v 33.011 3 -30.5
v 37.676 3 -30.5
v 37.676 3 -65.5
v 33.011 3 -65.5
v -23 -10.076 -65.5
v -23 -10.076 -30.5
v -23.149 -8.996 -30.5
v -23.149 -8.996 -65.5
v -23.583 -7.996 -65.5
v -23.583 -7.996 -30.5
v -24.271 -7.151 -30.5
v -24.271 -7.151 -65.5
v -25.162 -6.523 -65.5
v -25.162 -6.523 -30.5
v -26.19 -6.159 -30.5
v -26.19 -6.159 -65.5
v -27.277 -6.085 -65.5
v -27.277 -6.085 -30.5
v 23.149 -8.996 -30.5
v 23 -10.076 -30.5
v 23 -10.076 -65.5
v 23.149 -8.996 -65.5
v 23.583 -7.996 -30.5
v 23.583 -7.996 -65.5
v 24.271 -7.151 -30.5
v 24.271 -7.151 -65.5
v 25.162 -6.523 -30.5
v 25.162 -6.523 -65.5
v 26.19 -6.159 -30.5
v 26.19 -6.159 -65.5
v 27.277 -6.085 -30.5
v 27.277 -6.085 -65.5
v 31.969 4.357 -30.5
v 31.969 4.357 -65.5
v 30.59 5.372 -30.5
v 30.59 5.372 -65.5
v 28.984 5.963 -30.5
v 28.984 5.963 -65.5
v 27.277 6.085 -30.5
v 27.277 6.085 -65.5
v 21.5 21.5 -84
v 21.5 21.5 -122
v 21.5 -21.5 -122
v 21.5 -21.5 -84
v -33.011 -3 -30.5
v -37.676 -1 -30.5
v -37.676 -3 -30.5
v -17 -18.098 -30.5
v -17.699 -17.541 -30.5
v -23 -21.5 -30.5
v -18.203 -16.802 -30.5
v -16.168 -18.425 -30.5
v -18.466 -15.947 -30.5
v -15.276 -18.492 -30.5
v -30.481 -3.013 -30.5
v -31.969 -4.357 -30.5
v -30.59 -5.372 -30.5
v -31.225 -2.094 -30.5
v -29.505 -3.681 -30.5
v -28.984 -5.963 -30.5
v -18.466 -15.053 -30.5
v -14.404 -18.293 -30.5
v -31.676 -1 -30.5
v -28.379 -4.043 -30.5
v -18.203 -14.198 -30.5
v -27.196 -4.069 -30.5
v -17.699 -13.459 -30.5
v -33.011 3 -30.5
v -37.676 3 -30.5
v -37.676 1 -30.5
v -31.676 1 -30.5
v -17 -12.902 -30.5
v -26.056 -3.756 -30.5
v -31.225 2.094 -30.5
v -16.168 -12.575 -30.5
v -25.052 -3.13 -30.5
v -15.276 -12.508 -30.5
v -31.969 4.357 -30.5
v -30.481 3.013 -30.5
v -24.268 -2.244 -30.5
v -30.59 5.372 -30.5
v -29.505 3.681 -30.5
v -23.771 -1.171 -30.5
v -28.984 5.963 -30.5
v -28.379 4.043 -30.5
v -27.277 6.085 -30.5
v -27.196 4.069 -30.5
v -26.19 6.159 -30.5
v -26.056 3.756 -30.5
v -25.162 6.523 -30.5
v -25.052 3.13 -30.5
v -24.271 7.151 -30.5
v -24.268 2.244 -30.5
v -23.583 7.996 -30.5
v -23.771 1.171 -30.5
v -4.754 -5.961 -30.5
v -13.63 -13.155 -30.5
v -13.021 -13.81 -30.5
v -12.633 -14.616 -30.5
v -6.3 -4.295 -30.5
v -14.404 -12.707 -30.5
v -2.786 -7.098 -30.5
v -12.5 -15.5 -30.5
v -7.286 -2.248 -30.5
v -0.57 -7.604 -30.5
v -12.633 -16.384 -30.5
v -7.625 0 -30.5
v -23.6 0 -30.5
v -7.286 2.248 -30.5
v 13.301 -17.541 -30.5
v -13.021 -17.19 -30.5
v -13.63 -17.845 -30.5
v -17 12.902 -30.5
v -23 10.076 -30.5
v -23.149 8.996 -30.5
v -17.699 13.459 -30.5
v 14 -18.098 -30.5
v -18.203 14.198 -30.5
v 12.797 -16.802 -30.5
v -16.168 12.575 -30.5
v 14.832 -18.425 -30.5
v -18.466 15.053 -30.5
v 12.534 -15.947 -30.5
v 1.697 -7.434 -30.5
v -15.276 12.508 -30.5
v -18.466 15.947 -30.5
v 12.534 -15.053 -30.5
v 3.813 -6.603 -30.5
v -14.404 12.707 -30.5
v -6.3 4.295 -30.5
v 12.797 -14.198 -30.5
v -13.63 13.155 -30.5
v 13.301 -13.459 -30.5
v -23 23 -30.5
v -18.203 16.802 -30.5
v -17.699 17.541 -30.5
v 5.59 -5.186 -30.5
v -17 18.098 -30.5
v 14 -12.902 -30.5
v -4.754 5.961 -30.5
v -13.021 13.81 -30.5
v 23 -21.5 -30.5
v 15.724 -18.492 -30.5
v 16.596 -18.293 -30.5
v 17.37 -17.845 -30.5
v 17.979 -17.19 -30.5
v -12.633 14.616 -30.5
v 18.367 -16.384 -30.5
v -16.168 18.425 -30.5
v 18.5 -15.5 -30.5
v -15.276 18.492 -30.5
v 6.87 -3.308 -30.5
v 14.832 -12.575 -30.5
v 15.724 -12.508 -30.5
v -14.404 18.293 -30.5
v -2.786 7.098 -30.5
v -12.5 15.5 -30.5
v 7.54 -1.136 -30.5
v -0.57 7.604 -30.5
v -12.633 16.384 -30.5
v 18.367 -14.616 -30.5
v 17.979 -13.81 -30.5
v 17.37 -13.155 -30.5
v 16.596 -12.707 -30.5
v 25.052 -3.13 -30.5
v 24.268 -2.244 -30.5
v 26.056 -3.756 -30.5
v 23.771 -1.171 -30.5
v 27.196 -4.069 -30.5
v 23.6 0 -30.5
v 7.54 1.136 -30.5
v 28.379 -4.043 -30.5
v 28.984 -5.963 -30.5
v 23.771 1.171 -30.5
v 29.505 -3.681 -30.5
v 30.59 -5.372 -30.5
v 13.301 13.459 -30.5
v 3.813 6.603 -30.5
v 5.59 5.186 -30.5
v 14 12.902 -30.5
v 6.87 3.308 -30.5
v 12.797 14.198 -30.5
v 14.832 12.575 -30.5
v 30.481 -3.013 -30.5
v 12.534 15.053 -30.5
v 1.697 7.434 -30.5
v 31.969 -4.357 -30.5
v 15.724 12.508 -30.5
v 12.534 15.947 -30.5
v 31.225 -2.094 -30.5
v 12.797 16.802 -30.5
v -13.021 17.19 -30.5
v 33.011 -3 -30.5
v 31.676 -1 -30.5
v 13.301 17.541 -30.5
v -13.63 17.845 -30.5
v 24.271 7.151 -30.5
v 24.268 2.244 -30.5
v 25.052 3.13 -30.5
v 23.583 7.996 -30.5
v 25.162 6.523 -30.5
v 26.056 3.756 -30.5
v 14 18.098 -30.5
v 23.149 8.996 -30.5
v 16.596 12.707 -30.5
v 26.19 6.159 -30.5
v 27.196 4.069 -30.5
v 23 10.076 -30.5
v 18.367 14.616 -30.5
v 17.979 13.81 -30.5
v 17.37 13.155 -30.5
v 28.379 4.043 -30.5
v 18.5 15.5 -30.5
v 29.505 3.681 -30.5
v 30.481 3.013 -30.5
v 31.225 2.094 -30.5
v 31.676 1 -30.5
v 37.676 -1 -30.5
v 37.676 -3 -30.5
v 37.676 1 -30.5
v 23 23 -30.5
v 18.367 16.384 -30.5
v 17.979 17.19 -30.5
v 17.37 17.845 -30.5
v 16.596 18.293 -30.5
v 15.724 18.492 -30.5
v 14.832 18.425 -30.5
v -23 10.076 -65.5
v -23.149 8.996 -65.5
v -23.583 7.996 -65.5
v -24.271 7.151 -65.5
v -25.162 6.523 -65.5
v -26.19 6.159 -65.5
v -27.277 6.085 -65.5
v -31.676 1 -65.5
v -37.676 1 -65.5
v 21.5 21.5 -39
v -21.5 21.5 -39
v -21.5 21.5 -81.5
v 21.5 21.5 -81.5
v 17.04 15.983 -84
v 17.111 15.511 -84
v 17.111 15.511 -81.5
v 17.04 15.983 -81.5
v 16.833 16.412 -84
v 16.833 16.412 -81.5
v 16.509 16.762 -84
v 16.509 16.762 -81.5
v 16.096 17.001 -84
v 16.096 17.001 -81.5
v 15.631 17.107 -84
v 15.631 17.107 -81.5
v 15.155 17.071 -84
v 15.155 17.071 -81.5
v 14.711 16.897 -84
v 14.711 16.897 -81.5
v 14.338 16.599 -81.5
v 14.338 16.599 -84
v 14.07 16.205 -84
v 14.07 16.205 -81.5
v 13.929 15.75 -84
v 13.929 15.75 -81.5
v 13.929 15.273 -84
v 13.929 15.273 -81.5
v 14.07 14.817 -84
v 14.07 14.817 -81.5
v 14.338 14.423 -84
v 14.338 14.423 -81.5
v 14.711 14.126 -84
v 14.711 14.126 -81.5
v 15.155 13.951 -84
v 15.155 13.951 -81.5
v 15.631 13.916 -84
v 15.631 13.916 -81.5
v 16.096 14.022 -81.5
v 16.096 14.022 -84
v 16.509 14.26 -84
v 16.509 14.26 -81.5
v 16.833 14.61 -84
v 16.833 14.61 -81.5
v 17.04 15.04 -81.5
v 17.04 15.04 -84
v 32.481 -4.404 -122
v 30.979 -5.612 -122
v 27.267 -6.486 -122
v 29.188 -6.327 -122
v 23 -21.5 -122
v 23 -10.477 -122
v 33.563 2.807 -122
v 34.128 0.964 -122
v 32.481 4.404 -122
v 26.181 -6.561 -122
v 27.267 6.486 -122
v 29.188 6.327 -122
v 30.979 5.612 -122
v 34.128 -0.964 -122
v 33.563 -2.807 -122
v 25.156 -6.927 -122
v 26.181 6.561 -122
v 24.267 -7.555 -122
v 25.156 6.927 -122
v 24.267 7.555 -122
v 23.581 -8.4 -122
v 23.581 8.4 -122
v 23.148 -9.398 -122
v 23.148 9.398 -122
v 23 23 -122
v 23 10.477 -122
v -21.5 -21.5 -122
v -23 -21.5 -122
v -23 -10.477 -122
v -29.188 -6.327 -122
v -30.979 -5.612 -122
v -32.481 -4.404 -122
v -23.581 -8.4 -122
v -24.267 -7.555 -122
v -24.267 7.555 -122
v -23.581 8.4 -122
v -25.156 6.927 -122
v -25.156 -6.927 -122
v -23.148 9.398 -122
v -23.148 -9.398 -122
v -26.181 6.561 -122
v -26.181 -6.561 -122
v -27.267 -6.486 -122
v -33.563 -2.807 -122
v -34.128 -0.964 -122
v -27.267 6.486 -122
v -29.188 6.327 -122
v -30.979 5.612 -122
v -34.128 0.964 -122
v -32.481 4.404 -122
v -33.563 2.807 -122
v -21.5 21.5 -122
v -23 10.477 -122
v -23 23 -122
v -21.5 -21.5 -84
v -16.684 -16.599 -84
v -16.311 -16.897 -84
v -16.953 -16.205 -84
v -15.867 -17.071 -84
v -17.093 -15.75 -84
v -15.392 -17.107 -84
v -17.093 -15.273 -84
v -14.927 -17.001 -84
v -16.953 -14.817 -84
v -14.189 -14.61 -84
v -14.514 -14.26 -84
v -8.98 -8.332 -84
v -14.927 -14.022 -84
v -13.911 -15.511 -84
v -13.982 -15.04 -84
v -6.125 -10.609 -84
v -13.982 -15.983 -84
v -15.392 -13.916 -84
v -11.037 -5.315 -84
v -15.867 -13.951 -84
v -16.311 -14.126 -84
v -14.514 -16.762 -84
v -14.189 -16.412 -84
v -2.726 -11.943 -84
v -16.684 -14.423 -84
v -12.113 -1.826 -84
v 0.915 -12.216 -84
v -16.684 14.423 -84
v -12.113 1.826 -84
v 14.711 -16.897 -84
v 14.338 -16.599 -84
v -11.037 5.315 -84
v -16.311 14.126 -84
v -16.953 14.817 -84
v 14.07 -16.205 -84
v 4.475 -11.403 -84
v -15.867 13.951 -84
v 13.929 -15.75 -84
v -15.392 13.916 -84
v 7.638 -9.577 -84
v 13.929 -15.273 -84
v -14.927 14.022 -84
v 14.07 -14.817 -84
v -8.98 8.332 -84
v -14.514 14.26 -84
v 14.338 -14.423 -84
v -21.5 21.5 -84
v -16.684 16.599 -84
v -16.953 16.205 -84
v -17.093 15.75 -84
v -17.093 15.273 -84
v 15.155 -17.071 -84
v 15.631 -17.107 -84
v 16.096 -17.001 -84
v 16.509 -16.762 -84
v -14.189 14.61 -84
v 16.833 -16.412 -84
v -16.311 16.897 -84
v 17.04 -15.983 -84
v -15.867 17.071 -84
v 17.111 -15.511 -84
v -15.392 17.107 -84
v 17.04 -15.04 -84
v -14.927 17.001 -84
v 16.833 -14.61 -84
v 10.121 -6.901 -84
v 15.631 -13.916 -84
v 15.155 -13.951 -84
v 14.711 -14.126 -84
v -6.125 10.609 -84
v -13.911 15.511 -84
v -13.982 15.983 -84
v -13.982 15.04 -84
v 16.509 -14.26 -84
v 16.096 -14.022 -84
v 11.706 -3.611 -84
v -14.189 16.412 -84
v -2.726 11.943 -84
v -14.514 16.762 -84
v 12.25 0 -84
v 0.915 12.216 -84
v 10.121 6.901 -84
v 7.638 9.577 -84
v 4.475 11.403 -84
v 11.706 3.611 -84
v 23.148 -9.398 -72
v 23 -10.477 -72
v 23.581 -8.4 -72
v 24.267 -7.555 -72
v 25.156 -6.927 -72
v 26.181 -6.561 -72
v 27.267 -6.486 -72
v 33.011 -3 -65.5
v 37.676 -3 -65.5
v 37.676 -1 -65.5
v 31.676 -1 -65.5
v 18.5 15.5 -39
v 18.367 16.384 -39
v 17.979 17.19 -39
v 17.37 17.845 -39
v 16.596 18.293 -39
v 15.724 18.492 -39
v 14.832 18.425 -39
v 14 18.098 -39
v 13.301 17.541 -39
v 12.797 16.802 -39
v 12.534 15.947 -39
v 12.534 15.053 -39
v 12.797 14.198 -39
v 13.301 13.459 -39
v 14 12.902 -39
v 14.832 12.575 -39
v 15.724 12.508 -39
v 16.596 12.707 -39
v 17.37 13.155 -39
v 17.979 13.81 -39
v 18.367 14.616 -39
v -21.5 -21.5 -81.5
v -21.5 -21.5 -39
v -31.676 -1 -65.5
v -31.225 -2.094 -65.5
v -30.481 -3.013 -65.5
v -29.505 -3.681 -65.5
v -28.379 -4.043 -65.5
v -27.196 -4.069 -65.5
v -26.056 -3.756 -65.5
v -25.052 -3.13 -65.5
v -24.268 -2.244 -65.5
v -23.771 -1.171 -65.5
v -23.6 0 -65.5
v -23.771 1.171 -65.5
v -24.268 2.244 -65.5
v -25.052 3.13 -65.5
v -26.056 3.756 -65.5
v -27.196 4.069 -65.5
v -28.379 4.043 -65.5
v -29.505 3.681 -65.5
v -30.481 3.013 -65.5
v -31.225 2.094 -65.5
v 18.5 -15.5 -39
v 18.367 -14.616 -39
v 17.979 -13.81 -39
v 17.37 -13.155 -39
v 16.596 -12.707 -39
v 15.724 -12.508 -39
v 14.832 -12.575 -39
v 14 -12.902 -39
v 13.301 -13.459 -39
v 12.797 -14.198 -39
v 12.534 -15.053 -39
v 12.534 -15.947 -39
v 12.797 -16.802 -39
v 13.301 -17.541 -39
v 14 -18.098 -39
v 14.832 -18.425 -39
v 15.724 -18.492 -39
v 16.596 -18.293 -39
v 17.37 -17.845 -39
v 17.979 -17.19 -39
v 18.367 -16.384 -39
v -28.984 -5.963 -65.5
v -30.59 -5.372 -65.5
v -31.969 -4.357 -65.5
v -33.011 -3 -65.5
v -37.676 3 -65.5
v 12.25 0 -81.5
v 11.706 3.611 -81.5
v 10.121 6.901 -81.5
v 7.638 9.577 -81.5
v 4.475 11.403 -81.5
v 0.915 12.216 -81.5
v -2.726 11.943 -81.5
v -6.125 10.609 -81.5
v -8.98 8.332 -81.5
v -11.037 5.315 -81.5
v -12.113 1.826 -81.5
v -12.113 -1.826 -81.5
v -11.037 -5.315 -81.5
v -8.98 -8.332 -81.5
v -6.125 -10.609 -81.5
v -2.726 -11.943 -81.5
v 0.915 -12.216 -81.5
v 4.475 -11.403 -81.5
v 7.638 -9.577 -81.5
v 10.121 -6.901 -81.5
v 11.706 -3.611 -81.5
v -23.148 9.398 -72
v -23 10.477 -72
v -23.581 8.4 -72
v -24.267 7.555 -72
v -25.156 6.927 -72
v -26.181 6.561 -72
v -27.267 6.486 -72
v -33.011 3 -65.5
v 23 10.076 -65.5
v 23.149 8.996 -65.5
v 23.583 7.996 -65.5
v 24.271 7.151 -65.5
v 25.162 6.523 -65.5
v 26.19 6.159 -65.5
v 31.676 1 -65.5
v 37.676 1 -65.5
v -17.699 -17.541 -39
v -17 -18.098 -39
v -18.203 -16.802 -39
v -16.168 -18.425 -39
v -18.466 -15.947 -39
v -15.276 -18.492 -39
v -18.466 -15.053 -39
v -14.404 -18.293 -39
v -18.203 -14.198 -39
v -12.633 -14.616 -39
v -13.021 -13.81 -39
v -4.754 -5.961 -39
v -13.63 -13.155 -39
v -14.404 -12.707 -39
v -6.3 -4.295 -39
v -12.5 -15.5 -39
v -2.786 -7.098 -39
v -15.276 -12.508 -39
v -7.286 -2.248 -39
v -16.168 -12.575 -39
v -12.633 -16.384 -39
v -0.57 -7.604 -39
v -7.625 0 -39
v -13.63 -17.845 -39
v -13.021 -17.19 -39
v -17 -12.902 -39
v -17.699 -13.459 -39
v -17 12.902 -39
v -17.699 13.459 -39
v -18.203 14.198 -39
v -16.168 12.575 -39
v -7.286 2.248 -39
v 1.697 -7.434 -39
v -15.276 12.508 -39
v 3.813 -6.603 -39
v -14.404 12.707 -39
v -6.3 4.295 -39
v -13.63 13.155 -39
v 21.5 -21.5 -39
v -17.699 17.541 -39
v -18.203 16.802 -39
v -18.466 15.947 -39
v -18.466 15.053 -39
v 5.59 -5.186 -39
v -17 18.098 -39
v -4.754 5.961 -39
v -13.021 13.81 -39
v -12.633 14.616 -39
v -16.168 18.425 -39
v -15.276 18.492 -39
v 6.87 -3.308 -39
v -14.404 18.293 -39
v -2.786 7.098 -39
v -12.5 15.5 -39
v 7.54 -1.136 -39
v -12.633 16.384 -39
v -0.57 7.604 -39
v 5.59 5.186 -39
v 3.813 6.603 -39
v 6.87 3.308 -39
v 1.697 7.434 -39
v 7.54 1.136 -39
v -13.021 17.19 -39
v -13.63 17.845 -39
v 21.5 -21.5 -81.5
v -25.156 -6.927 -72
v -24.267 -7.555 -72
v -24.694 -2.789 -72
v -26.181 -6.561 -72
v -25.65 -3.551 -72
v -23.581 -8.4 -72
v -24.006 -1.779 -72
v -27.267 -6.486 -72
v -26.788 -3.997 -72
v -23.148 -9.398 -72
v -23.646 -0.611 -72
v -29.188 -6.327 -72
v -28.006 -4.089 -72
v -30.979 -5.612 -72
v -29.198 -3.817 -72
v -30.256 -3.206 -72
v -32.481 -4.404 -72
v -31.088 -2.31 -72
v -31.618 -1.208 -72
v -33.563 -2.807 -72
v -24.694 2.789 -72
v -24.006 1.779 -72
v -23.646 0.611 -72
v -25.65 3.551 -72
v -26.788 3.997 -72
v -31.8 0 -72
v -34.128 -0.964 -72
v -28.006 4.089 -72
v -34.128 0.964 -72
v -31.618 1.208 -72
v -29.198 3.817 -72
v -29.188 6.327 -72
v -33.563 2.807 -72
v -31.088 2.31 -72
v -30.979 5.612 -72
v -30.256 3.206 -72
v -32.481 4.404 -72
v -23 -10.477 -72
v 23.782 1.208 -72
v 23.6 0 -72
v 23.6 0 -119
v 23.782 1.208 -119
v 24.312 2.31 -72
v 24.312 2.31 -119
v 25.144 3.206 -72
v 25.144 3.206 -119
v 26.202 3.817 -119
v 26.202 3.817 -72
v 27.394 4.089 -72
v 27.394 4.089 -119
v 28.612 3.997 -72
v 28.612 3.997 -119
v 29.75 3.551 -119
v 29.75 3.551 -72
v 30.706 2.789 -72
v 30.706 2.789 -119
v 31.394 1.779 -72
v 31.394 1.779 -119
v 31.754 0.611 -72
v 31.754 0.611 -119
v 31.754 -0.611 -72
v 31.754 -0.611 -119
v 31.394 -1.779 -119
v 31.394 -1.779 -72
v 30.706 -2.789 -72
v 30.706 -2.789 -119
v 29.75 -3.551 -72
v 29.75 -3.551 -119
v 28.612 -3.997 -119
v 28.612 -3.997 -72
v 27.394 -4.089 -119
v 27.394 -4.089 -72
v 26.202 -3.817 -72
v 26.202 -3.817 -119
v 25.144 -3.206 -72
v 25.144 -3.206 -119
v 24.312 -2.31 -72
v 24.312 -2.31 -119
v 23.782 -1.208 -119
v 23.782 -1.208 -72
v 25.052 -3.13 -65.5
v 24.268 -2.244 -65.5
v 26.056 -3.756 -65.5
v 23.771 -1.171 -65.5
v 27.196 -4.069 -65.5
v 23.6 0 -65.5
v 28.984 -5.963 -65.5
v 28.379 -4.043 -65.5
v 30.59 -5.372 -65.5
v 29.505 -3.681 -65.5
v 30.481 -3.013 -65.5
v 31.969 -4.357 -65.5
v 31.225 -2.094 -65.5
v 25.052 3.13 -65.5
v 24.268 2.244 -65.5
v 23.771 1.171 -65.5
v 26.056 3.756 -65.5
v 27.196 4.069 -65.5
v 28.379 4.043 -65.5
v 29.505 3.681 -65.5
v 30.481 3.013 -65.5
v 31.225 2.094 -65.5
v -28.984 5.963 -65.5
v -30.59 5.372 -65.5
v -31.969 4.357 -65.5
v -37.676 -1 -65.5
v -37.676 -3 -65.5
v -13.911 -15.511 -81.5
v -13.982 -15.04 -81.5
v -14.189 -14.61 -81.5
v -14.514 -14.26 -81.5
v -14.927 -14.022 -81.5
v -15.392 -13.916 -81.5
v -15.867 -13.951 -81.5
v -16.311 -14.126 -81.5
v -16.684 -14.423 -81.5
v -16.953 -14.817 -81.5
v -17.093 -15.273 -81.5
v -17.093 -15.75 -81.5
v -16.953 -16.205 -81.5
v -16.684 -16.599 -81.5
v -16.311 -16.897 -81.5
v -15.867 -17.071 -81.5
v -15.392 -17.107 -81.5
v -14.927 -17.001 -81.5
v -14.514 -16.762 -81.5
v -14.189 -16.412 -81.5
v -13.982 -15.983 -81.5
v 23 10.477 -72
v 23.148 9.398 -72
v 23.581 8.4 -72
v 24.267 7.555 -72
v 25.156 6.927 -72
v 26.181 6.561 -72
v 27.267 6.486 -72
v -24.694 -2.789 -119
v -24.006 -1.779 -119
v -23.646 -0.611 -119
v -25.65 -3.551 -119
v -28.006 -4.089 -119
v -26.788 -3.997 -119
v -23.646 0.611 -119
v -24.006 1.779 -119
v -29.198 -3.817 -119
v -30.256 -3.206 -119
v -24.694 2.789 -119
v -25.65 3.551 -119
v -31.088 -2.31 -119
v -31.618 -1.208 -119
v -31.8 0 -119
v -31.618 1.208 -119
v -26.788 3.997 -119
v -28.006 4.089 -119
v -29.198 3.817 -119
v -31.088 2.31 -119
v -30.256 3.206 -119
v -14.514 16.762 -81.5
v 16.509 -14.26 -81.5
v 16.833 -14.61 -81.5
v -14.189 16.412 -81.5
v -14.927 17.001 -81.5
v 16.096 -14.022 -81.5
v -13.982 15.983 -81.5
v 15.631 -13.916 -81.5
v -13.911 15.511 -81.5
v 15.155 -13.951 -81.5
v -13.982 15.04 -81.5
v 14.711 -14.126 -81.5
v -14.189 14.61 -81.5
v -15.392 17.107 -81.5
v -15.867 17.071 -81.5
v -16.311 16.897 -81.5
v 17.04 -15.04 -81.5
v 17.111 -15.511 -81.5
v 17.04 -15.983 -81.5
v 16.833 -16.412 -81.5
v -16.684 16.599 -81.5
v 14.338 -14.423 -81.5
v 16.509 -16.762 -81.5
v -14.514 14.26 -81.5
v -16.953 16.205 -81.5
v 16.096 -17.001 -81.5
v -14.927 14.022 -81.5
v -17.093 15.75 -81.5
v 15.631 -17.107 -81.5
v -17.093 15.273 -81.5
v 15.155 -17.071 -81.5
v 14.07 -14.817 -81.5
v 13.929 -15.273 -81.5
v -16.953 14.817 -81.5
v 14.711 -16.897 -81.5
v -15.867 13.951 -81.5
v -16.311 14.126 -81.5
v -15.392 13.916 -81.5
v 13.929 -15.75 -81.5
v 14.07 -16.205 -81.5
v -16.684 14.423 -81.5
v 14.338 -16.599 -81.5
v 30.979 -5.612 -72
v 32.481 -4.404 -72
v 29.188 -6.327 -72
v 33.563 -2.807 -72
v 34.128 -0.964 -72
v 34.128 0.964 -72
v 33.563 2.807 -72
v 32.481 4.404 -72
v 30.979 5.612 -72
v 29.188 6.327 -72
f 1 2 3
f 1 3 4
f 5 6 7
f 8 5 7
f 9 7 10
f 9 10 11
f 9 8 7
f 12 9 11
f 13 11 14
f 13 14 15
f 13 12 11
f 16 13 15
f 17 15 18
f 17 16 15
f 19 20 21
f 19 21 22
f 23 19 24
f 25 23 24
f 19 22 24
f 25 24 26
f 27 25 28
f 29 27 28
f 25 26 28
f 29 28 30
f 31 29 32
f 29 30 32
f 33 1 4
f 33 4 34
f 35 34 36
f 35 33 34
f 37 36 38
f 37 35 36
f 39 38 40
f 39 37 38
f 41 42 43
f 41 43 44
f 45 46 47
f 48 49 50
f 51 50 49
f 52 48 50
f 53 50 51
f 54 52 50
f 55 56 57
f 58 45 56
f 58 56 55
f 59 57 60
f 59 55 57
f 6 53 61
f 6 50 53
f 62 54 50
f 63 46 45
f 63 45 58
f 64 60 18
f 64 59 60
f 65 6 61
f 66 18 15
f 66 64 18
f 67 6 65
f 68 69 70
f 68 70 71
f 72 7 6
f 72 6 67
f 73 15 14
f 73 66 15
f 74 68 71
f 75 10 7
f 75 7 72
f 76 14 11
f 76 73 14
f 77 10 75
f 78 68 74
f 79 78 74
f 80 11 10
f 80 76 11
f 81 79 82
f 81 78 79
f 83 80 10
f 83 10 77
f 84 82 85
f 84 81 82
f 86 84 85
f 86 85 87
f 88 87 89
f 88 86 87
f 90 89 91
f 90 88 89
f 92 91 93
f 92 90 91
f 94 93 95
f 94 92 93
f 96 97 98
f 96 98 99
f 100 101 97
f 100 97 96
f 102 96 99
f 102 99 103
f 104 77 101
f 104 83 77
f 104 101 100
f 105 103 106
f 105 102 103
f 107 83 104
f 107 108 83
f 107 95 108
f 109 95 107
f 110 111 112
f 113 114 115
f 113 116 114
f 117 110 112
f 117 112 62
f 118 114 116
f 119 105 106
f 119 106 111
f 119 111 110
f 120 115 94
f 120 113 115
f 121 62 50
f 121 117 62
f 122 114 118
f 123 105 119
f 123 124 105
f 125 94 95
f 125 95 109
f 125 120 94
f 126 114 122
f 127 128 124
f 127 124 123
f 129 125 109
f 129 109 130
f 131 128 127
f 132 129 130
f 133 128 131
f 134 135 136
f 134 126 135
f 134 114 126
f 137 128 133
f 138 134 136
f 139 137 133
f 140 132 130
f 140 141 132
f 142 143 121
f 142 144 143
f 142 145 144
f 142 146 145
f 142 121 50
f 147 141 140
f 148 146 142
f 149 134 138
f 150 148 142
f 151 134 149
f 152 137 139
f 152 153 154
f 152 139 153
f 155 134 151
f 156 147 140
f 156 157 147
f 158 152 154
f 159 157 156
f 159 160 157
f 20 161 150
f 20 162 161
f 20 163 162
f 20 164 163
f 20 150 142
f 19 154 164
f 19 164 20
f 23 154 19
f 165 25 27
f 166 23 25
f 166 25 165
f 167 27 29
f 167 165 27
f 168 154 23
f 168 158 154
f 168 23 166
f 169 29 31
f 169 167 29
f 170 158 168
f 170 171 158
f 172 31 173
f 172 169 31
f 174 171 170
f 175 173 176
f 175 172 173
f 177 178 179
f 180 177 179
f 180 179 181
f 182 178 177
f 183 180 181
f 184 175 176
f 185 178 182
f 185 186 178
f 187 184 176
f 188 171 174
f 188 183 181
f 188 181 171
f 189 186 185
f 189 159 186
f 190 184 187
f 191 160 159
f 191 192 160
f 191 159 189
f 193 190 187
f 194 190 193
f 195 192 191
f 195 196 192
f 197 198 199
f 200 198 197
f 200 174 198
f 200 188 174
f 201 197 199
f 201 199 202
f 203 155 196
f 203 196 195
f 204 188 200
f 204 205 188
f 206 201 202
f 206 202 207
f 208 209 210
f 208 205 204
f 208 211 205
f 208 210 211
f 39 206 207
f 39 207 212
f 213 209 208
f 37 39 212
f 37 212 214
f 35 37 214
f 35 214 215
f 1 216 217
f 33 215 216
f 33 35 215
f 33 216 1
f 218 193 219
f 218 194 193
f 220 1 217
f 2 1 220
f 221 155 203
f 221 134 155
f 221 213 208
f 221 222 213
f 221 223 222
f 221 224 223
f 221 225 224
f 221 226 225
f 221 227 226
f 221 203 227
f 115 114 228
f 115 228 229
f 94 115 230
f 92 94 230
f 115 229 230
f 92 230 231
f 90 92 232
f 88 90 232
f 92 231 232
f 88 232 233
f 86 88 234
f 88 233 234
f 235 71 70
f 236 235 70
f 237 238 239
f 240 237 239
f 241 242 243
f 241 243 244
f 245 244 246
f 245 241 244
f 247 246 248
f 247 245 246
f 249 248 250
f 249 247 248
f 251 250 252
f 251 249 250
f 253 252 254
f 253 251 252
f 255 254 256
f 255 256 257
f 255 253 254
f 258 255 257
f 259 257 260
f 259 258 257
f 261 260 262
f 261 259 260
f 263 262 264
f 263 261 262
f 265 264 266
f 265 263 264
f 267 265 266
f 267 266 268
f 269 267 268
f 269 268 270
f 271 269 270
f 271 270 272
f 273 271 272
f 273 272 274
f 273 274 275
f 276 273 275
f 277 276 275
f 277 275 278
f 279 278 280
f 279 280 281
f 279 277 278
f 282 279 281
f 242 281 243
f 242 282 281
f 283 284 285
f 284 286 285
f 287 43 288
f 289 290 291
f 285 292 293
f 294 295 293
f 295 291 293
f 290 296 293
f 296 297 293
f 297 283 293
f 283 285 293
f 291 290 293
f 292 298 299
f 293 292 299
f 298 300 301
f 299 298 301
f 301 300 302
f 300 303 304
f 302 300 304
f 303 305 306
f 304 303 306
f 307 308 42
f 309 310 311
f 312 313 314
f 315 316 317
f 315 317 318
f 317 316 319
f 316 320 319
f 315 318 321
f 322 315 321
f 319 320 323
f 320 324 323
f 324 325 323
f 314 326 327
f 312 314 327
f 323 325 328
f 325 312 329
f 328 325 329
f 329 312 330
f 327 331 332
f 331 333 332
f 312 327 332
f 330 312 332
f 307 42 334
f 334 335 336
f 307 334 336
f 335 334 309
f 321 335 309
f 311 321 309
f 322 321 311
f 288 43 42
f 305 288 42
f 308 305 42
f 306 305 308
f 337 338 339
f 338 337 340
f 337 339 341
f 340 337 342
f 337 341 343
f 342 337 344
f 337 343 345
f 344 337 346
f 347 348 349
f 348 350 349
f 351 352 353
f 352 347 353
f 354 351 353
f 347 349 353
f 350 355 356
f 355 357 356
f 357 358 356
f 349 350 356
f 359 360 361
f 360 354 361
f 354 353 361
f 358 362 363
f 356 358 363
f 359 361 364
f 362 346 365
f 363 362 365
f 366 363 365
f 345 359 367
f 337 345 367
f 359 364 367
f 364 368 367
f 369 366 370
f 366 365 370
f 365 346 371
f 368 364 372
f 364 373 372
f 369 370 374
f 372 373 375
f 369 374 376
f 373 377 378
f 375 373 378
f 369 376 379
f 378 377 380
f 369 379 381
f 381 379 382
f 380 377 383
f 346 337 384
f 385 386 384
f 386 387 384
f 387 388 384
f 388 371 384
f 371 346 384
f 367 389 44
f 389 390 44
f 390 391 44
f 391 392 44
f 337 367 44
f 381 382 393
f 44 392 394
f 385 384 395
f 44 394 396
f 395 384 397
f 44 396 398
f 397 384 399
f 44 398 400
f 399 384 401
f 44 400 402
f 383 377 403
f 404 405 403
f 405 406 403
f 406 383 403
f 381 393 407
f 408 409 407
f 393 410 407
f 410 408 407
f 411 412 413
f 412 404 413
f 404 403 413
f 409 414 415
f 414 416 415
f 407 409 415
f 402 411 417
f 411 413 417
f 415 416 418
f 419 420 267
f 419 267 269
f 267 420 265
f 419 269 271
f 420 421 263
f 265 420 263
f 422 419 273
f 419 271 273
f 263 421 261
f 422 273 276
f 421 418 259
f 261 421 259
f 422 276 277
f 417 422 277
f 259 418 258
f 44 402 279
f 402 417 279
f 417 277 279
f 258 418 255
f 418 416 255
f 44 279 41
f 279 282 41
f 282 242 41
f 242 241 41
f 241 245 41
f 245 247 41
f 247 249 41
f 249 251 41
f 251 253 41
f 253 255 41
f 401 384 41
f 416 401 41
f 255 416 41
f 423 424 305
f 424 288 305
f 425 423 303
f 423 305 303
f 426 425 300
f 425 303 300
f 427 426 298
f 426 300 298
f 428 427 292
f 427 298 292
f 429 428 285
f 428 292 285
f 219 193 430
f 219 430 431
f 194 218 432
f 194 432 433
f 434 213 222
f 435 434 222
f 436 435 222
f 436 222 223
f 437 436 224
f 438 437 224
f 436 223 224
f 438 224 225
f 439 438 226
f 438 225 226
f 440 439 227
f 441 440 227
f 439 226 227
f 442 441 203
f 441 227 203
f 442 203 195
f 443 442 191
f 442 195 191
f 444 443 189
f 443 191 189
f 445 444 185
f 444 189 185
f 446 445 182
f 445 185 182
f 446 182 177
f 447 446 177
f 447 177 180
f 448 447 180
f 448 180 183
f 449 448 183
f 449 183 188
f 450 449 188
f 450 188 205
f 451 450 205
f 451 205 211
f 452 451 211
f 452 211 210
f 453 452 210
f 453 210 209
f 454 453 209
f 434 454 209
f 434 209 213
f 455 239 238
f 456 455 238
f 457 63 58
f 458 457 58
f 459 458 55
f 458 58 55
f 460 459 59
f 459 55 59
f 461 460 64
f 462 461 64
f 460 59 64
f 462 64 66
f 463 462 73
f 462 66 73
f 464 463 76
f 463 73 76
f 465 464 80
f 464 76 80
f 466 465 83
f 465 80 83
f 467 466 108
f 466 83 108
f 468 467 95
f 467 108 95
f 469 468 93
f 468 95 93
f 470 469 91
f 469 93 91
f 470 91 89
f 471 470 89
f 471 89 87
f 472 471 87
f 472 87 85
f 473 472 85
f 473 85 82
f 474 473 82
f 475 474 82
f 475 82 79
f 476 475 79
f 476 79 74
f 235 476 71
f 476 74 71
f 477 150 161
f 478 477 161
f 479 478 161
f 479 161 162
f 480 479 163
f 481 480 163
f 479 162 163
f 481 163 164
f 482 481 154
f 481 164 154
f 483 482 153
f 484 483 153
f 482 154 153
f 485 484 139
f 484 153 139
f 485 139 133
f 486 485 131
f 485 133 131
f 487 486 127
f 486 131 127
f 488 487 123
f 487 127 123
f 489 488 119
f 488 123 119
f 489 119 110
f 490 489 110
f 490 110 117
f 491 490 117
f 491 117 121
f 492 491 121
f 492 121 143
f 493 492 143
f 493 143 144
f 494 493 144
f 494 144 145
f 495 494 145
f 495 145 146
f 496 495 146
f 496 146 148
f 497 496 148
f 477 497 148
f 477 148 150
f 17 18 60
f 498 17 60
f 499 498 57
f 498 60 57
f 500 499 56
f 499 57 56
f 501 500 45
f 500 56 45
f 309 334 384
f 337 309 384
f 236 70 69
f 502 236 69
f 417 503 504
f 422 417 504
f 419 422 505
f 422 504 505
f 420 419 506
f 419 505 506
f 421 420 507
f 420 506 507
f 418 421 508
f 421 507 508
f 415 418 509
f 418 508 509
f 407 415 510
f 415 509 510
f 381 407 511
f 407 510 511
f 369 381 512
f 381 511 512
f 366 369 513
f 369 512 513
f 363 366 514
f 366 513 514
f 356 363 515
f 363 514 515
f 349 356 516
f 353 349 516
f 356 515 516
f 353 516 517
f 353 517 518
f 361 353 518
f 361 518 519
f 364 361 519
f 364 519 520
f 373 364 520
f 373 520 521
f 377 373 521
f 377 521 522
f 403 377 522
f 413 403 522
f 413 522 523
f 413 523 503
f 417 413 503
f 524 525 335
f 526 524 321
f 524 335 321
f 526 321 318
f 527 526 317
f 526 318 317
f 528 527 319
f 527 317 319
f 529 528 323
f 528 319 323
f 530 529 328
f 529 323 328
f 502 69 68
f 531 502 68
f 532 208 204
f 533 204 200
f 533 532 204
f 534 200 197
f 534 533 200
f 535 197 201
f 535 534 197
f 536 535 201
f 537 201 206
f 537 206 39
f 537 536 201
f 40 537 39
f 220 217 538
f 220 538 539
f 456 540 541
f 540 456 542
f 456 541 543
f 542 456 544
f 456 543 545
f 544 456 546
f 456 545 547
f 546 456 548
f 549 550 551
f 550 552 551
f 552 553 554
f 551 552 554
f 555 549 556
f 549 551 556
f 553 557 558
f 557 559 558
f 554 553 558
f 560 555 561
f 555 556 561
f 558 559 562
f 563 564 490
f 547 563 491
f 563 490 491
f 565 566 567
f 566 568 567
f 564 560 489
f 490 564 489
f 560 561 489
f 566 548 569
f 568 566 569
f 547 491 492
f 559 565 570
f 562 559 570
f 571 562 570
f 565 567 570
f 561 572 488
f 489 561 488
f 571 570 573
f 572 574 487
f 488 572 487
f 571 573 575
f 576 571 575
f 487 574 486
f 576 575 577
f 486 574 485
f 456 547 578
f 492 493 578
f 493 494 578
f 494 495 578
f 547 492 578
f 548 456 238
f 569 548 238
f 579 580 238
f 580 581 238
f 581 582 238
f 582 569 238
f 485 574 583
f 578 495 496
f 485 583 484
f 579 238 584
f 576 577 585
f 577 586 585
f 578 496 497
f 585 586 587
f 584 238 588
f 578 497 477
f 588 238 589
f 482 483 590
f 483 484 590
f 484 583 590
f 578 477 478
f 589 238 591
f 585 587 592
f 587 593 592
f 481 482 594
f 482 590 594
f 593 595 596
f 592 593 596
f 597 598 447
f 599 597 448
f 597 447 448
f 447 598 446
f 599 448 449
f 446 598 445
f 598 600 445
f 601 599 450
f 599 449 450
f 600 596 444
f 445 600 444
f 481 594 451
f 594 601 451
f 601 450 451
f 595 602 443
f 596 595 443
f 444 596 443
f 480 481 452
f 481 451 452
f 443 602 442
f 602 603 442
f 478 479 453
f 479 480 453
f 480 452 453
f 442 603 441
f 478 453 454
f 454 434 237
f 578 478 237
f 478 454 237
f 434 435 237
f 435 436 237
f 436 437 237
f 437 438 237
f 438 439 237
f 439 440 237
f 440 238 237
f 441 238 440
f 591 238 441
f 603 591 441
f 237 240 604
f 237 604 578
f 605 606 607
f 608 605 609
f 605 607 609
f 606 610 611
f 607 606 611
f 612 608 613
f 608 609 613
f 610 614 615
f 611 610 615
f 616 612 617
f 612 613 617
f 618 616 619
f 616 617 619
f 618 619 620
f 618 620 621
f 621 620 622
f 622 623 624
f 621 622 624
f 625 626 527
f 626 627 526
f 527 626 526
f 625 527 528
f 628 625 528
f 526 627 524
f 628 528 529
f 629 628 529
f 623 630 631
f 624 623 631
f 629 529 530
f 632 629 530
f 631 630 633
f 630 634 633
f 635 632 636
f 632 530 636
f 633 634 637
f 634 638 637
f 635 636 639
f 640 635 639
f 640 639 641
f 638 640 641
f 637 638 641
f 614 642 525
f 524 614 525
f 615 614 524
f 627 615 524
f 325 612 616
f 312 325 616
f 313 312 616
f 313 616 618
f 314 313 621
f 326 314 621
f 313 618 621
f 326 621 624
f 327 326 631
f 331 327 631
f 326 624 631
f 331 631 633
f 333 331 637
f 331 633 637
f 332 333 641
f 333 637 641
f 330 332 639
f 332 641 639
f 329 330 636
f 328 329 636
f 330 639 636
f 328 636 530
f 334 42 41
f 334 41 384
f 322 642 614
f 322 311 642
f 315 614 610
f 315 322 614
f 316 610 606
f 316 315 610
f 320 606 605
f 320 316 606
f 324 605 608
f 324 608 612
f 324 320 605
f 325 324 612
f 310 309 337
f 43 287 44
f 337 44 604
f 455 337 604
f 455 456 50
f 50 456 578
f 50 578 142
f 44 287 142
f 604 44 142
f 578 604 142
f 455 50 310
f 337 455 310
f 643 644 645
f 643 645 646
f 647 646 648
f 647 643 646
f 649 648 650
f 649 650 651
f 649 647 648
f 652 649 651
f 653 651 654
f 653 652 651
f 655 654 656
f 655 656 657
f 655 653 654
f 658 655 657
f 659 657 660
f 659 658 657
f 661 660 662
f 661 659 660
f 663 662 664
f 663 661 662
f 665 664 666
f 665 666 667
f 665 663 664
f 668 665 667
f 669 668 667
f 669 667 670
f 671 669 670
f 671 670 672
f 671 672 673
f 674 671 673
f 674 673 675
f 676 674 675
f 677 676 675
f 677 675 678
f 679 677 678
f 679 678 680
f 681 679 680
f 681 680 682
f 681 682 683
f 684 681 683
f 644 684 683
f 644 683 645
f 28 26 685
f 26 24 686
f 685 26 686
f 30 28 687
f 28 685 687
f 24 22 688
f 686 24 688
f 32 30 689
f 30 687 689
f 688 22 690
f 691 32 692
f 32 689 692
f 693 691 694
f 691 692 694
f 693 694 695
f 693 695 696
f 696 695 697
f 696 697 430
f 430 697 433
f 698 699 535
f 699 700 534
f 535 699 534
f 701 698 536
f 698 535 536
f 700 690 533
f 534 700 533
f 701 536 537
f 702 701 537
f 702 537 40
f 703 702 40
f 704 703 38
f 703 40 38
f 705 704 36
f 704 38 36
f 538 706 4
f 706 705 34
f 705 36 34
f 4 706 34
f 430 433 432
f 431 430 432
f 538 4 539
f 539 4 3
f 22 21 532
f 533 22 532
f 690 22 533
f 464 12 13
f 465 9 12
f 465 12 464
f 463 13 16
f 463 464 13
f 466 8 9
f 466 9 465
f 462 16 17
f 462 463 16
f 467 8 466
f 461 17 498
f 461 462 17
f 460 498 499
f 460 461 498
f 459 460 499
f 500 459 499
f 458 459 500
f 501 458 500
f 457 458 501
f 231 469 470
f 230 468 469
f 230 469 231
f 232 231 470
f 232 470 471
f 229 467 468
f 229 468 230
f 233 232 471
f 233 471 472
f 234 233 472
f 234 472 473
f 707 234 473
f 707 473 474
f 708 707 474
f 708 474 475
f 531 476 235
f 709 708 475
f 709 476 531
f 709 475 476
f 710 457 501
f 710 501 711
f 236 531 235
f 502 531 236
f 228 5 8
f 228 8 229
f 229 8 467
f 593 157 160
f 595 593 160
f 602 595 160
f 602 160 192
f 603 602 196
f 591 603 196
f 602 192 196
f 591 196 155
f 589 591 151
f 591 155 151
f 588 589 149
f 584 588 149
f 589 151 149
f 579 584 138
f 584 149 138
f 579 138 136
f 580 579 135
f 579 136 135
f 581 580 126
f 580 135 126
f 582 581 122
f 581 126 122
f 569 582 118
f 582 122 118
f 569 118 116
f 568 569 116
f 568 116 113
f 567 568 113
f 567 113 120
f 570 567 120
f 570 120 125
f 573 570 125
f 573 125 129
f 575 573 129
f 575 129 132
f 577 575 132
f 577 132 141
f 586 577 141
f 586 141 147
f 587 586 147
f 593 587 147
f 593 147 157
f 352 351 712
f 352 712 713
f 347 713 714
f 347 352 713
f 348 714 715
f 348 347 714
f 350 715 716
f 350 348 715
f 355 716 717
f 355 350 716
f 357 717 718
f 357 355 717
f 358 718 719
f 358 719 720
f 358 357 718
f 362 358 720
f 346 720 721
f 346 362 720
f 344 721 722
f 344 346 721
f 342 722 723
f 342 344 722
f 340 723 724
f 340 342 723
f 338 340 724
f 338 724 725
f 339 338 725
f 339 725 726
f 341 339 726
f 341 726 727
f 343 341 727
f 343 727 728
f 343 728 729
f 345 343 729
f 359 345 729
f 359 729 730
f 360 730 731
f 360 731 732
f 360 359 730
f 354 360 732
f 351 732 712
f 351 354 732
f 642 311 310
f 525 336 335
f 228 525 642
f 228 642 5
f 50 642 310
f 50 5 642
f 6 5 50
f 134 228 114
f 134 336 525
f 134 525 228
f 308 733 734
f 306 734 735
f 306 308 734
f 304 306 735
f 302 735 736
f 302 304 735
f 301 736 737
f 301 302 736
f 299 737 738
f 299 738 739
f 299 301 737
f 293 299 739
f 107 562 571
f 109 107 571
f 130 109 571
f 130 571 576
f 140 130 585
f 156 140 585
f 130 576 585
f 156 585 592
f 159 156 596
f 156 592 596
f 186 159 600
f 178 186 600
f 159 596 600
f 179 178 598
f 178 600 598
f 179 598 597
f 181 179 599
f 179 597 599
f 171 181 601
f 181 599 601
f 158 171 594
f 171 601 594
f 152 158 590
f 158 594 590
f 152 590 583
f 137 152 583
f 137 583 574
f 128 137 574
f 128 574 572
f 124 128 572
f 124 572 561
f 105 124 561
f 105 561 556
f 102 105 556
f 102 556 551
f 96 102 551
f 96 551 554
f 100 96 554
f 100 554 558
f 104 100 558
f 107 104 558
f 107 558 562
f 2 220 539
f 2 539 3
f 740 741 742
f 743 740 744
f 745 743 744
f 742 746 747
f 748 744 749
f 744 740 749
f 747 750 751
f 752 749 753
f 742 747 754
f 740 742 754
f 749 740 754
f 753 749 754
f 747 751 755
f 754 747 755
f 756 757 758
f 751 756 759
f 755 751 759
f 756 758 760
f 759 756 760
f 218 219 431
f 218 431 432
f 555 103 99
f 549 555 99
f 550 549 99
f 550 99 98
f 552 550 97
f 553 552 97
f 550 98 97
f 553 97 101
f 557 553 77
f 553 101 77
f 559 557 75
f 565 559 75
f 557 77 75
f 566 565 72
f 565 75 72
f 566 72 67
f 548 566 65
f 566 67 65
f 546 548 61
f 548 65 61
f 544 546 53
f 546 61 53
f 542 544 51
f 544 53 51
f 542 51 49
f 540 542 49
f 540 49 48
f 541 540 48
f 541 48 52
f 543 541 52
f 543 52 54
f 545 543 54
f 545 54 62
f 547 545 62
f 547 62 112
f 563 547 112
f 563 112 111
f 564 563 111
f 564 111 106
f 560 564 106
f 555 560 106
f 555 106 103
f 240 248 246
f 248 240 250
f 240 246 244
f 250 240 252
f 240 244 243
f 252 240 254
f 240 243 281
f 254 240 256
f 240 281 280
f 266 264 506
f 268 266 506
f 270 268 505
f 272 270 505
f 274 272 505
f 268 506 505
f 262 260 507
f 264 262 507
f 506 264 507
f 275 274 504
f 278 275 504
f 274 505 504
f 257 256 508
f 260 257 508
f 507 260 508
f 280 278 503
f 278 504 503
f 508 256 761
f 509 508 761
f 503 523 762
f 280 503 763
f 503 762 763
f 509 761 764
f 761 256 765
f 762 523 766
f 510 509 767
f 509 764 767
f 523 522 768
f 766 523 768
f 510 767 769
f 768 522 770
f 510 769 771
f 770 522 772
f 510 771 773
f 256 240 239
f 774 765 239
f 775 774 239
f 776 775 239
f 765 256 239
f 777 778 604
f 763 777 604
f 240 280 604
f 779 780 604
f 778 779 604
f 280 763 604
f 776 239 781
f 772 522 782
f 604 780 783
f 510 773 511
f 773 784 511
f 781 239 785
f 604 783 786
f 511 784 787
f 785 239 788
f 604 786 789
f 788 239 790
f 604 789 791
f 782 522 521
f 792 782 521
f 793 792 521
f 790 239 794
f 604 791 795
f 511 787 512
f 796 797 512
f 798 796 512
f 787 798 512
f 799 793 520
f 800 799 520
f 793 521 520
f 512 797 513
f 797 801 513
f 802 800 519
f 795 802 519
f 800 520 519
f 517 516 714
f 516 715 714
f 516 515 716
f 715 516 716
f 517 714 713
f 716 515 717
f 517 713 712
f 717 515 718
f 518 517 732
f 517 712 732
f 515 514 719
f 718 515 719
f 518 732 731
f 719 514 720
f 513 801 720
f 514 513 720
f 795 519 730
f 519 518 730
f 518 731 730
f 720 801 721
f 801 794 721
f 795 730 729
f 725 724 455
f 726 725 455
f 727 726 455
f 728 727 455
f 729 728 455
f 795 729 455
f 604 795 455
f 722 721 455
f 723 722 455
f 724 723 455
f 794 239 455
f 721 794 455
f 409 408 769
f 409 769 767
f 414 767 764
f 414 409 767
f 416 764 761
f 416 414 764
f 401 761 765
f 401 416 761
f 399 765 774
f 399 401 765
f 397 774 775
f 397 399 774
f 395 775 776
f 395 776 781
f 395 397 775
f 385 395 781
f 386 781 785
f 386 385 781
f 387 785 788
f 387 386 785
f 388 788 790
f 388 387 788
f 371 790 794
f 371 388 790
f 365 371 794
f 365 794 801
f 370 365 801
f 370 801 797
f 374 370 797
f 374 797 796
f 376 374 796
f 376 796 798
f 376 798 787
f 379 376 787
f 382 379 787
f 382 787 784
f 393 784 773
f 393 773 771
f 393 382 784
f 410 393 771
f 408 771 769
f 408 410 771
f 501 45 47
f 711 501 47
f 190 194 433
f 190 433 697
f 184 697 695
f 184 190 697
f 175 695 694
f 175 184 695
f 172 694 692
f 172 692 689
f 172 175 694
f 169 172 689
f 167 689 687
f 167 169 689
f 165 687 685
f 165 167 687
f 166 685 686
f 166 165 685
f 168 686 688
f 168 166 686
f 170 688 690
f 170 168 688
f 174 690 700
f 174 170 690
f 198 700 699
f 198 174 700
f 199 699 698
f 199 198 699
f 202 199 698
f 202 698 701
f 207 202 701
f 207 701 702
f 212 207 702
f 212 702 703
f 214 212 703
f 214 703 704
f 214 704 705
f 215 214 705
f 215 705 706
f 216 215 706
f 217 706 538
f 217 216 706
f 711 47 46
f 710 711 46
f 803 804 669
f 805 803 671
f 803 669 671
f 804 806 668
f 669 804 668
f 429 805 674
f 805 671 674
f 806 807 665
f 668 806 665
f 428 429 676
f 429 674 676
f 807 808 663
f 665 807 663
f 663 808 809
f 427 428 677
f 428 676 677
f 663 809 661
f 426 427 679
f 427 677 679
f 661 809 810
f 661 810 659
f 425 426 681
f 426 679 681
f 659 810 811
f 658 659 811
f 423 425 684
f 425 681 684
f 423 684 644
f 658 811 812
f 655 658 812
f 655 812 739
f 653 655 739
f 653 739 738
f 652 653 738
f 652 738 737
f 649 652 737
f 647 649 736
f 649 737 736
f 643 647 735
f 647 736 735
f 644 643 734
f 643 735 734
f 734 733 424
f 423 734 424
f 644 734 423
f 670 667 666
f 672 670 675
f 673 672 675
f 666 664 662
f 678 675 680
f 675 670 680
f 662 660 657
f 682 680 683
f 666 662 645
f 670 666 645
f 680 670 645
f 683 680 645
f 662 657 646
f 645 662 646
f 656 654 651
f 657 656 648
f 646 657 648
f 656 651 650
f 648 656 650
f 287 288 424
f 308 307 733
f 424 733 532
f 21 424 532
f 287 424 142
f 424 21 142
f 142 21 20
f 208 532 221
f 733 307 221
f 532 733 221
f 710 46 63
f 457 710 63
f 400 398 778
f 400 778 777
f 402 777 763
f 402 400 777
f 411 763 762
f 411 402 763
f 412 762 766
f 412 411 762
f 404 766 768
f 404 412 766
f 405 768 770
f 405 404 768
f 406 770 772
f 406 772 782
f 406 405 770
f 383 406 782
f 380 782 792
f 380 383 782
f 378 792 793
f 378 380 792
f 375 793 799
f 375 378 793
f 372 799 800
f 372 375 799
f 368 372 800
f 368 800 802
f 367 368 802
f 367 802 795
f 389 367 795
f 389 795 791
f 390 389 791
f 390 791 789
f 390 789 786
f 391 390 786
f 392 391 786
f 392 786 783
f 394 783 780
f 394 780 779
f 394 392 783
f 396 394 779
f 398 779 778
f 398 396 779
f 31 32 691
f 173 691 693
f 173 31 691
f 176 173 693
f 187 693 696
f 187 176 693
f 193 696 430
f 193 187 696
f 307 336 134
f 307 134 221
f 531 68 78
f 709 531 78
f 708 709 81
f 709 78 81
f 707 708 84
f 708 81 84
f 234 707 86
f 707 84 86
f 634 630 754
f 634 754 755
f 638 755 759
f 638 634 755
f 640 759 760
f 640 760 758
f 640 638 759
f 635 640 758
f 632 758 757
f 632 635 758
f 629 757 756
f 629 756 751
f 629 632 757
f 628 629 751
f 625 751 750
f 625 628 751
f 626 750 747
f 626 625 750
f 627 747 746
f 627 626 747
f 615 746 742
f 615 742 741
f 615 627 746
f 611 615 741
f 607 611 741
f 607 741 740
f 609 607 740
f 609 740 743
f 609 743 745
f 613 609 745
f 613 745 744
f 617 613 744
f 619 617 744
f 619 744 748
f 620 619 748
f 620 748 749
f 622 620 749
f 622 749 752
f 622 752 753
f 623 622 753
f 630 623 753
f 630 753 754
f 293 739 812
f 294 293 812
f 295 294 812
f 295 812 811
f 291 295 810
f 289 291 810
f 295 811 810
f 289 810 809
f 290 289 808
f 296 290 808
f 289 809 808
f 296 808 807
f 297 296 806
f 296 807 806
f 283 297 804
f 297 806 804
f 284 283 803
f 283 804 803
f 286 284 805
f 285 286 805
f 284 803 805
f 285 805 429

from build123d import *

# Parameters (mm, degrees)
CROQUIS2_W              = 43
CROQUIS2_H              = 43
CROQUIS2_R              = 1.6
SALIENTE_EXTRUIR2_DEPTH = 2.5
SALIENTE_EXTRUIR3_DEPTH = 1.5
SALIENTE_EXTRUIR4_DEPTH = 1.5
SALIENTE_EXTRUIR5_DEPTH = 1.5
CROQUIS7_W              = 46
CROQUIS7_H              = 8.5
SALIENTE_EXTRUIR6_DEPTH = 44.5
CROQUIS8_R              = 7.625
CORTAR_EXTRUIR1_DEPTH   = 90.145947749
CROQUIS9_R              = 3
CORTAR_EXTRUIR3_DEPTH   = 16.5
SALIENTE_EXTRUIR8_DEPTH = 1.5
SALIENTE_EXTRUIR9_DEPTH = 1.5
CROQUIS12_R             = 12.25
CUT_EXTRUDE1_DEPTH      = 10
BOSS_EXTRUDE1_DEPTH     = 35
BOSS_EXTRUDE2_START     = -50
SKETCH3_R               = 4.1
BOSS_EXTRUDE2_DEPTH     = 50
BOSS_EXTRUDE3_START     = -3
SKETCH4_R               = 4.1
BOSS_EXTRUDE3_DEPTH     = 3
FILLET1_R               = 4


with BuildPart() as part:
    # Croquis2 → Saliente-Extruir2 (new body)
    with BuildSketch(Plane.XY.offset(-84)):
        Rectangle(CROQUIS2_W, CROQUIS2_H)
        with Locations((-15.511143721, 15.511143721)):
            Circle(CROQUIS2_R, mode=Mode.SUBTRACT)
        with Locations((15.511143721, 15.511143721)):
            Circle(CROQUIS2_R, mode=Mode.SUBTRACT)
        with Locations((15.511143721, -15.511143721)):
            Circle(CROQUIS2_R, mode=Mode.SUBTRACT)
        with Locations((-15.511143721, -15.511143721)):
            Circle(CROQUIS2_R, mode=Mode.SUBTRACT)
    extrude(amount=SALIENTE_EXTRUIR2_DEPTH)

    # Croquis4 → Saliente-Extruir3 (add)
    with BuildSketch(Plane(origin=(0, 21.5, 0), x_dir=(1, 0, 0), z_dir=(0, 1, 0))):
        Polygon((-21.5, 84), (-21.5, 122), (21.5, 122), (21.5, 84), (21.5, 39), (-21.5, 39), align=None)
    extrude(amount=SALIENTE_EXTRUIR3_DEPTH)

    # Croquis5 → Saliente-Extruir4 (add)
    with BuildSketch(Plane.ZY.offset(21.5)):
        Polygon((-60.25, 21.5), (-39, 21.5), (-39, 23), (-122, 23), (-122, 21.5), (-122, -21.5), (-84, -21.5), (-81.5, -21.5), (-81.5, 0), (-81.5, 21.5), align=None)
    extrude(amount=SALIENTE_EXTRUIR4_DEPTH)

    # Croquis6 → Saliente-Extruir5 (add)
    with BuildSketch(Plane(origin=(21.5, 0, 0), x_dir=(0, 0, -1), z_dir=(1, 0, 0))):
        Polygon((122, 21.5), (122, -21.5), (84, -21.5), (81.5, -21.5), (81.5, 0), (81.5, 21.5), (64, 21.5), (39, 21.5), (39, 23), (122, 23), align=None)
    extrude(amount=SALIENTE_EXTRUIR5_DEPTH)

    # Croquis7 → Saliente-Extruir6 (add)
    with BuildSketch(Plane(origin=(0, 23, 0), x_dir=(1, 0, 0), z_dir=(0, 1, 0))):
        with Locations((0, 34.75)):
            Rectangle(CROQUIS7_W, CROQUIS7_H)
    extrude(amount=-SALIENTE_EXTRUIR6_DEPTH)

    # Croquis8 → Cortar-Extruir1 (cut, through all)
    with BuildSketch(Plane(origin=(0, 0, -39), x_dir=(-1, 0, 0), z_dir=(0, 0, -1))):
        Circle(CROQUIS8_R)
    extrude(amount=-CORTAR_EXTRUIR1_DEPTH, mode=Mode.SUBTRACT)

    # Croquis9 → Cortar-Extruir3 (cut)
    with BuildSketch(Plane.XY.offset(-30.5)):
        with Locations((-15.5, 15.5)):
            Circle(CROQUIS9_R)
        with Locations((15.5, 15.5)):
            Circle(CROQUIS9_R)
        with Locations((-15.5, -15.5)):
            Circle(CROQUIS9_R)
        with Locations((15.5, -15.5)):
            Circle(CROQUIS9_R)
    extrude(amount=-CORTAR_EXTRUIR3_DEPTH, mode=Mode.SUBTRACT)

    # Croquis10 → Saliente-Extruir8 (add)
    with BuildSketch(Plane.ZY.offset(23)):
        Polygon((-39, -21.5), (-39, 21.5), (-81.5, 21.5), (-81.5, 0), (-81.5, -21.5), align=None)
    extrude(amount=-SALIENTE_EXTRUIR8_DEPTH)

    # Croquis11 → Saliente-Extruir9 (add)
    with BuildSketch(Plane(origin=(23, 0, 0), x_dir=(0, 0, -1), z_dir=(1, 0, 0))):
        Polygon((39, 21.5), (81.5, 21.5), (81.5, 0), (81.5, -21.5), (39, -21.5), align=None)
    extrude(amount=-SALIENTE_EXTRUIR9_DEPTH)

    # Croquis12 → Cut-Extrude1 (cut)
    with BuildSketch(Plane.XY.offset(-81.5)):
        Circle(CROQUIS12_R)
    extrude(amount=-CUT_EXTRUDE1_DEPTH, mode=Mode.SUBTRACT)

    # Sketch2 → Boss-Extrude1 (add)
    with BuildSketch(Plane.XY.offset(-30.5)):
        with BuildLine():
            Line((-37.67617907, 1), (-37.67617907, 3))
            Line((-37.67617907, 3), (-33.01130869, 3))
            ThreePointArc((-33.01130869, 3), (-28.23921976, 6.076120641), (-23, 3.888444419))
            Line((-23, 3.888444419), (-23, -3.888444419))
            ThreePointArc((-23, -3.888444419), (-28.23921976, -6.076120641), (-33.01130869, -3))
            Line((-33.01130869, -3), (-37.67617907, -3))
            Line((-37.67617907, -3), (-37.67617907, -1))
            Line((-37.67617907, -1), (-31.67617907, -1))
            ThreePointArc((-31.67617907, -1), (-23.6, 0), (-31.67617907, 1))
            Line((-31.67617907, 1), (-37.67617907, 1))
        make_face()
        with BuildLine():
            Line((23, 3.888444419), (23, -3.888444419))
            ThreePointArc((23, -3.888444419), (28.23921976, -6.076120641), (33.01130869, -3))
            Line((33.01130869, -3), (37.67617907, -3))
            Line((37.67617907, -3), (37.67617907, -1))
            Line((37.67617907, -1), (31.67617907, -1))
            ThreePointArc((31.67617907, -1), (23.6, 0), (31.67617907, 1))
            Line((31.67617907, 1), (37.67617907, 1))
            Line((37.67617907, 1), (37.67617907, 3))
            Line((37.67617907, 3), (33.01130869, 3))
            ThreePointArc((33.01130869, 3), (28.23921976, 6.076120641), (23, 3.888444419))
        make_face()
    extrude(amount=-BOSS_EXTRUDE1_DEPTH)

    # Sketch3 → Boss-Extrude2 (add)
    # profile 1 of 2: a face of its own
    with BuildSketch(Plane(origin=(0, 0, -122), x_dir=(-1, 0, 0), z_dir=(0, 0, -1)).offset(BOSS_EXTRUDE2_START)):
        with BuildLine():
            Line((-23, -4.489988864), (-23, 4.489988864))
            ThreePointArc((-23, 4.489988864), (-34.2, 0), (-23, -4.489988864))
        make_face()
        with Locations((-27.7, 0)):
            Circle(SKETCH3_R, mode=Mode.SUBTRACT)
    # profile 2 of 2: a face of its own
    with BuildSketch(Plane(origin=(0, 0, -122), x_dir=(-1, 0, 0), z_dir=(0, 0, -1)).offset(BOSS_EXTRUDE2_START)):
        with BuildLine():
            ThreePointArc((23, -4.489988864), (34.2, 0), (23, 4.489988864))
            Line((23, 4.489988864), (23, -4.489988864))
        make_face()
        with Locations((27.7, 0)):
            Circle(SKETCH3_R, mode=Mode.SUBTRACT)
    extrude(amount=BOSS_EXTRUDE2_DEPTH)

    # Sketch4 → Boss-Extrude3 (add)
    with BuildSketch(Plane(origin=(0, 0, -122), x_dir=(-1, 0, 0), z_dir=(0, 0, -1)).offset(BOSS_EXTRUDE3_START)):
        with Locations((-27.7, 0)):
            Circle(SKETCH4_R)
        with Locations((27.7, 0)):
            Circle(SKETCH4_R)
    extrude(amount=BOSS_EXTRUDE3_DEPTH)

    # Fillet1
    fillet1_edges = [part.edges().sort_by_distance(p)[0] for p in [
        (-23, 3.888444419, -48),
        (-23, -3.888444419, -48),
        (23, 3.888444419, -48),
        (23, -3.888444419, -48),
        (23, 4.489988864, -97),
        (23, -4.489988864, -97),
        (-23, -4.489988864, -97),
        (-23, 4.489988864, -97),
    ]]
    fillet(fillet1_edges, radius=FILLET1_R)


solid = part.part
